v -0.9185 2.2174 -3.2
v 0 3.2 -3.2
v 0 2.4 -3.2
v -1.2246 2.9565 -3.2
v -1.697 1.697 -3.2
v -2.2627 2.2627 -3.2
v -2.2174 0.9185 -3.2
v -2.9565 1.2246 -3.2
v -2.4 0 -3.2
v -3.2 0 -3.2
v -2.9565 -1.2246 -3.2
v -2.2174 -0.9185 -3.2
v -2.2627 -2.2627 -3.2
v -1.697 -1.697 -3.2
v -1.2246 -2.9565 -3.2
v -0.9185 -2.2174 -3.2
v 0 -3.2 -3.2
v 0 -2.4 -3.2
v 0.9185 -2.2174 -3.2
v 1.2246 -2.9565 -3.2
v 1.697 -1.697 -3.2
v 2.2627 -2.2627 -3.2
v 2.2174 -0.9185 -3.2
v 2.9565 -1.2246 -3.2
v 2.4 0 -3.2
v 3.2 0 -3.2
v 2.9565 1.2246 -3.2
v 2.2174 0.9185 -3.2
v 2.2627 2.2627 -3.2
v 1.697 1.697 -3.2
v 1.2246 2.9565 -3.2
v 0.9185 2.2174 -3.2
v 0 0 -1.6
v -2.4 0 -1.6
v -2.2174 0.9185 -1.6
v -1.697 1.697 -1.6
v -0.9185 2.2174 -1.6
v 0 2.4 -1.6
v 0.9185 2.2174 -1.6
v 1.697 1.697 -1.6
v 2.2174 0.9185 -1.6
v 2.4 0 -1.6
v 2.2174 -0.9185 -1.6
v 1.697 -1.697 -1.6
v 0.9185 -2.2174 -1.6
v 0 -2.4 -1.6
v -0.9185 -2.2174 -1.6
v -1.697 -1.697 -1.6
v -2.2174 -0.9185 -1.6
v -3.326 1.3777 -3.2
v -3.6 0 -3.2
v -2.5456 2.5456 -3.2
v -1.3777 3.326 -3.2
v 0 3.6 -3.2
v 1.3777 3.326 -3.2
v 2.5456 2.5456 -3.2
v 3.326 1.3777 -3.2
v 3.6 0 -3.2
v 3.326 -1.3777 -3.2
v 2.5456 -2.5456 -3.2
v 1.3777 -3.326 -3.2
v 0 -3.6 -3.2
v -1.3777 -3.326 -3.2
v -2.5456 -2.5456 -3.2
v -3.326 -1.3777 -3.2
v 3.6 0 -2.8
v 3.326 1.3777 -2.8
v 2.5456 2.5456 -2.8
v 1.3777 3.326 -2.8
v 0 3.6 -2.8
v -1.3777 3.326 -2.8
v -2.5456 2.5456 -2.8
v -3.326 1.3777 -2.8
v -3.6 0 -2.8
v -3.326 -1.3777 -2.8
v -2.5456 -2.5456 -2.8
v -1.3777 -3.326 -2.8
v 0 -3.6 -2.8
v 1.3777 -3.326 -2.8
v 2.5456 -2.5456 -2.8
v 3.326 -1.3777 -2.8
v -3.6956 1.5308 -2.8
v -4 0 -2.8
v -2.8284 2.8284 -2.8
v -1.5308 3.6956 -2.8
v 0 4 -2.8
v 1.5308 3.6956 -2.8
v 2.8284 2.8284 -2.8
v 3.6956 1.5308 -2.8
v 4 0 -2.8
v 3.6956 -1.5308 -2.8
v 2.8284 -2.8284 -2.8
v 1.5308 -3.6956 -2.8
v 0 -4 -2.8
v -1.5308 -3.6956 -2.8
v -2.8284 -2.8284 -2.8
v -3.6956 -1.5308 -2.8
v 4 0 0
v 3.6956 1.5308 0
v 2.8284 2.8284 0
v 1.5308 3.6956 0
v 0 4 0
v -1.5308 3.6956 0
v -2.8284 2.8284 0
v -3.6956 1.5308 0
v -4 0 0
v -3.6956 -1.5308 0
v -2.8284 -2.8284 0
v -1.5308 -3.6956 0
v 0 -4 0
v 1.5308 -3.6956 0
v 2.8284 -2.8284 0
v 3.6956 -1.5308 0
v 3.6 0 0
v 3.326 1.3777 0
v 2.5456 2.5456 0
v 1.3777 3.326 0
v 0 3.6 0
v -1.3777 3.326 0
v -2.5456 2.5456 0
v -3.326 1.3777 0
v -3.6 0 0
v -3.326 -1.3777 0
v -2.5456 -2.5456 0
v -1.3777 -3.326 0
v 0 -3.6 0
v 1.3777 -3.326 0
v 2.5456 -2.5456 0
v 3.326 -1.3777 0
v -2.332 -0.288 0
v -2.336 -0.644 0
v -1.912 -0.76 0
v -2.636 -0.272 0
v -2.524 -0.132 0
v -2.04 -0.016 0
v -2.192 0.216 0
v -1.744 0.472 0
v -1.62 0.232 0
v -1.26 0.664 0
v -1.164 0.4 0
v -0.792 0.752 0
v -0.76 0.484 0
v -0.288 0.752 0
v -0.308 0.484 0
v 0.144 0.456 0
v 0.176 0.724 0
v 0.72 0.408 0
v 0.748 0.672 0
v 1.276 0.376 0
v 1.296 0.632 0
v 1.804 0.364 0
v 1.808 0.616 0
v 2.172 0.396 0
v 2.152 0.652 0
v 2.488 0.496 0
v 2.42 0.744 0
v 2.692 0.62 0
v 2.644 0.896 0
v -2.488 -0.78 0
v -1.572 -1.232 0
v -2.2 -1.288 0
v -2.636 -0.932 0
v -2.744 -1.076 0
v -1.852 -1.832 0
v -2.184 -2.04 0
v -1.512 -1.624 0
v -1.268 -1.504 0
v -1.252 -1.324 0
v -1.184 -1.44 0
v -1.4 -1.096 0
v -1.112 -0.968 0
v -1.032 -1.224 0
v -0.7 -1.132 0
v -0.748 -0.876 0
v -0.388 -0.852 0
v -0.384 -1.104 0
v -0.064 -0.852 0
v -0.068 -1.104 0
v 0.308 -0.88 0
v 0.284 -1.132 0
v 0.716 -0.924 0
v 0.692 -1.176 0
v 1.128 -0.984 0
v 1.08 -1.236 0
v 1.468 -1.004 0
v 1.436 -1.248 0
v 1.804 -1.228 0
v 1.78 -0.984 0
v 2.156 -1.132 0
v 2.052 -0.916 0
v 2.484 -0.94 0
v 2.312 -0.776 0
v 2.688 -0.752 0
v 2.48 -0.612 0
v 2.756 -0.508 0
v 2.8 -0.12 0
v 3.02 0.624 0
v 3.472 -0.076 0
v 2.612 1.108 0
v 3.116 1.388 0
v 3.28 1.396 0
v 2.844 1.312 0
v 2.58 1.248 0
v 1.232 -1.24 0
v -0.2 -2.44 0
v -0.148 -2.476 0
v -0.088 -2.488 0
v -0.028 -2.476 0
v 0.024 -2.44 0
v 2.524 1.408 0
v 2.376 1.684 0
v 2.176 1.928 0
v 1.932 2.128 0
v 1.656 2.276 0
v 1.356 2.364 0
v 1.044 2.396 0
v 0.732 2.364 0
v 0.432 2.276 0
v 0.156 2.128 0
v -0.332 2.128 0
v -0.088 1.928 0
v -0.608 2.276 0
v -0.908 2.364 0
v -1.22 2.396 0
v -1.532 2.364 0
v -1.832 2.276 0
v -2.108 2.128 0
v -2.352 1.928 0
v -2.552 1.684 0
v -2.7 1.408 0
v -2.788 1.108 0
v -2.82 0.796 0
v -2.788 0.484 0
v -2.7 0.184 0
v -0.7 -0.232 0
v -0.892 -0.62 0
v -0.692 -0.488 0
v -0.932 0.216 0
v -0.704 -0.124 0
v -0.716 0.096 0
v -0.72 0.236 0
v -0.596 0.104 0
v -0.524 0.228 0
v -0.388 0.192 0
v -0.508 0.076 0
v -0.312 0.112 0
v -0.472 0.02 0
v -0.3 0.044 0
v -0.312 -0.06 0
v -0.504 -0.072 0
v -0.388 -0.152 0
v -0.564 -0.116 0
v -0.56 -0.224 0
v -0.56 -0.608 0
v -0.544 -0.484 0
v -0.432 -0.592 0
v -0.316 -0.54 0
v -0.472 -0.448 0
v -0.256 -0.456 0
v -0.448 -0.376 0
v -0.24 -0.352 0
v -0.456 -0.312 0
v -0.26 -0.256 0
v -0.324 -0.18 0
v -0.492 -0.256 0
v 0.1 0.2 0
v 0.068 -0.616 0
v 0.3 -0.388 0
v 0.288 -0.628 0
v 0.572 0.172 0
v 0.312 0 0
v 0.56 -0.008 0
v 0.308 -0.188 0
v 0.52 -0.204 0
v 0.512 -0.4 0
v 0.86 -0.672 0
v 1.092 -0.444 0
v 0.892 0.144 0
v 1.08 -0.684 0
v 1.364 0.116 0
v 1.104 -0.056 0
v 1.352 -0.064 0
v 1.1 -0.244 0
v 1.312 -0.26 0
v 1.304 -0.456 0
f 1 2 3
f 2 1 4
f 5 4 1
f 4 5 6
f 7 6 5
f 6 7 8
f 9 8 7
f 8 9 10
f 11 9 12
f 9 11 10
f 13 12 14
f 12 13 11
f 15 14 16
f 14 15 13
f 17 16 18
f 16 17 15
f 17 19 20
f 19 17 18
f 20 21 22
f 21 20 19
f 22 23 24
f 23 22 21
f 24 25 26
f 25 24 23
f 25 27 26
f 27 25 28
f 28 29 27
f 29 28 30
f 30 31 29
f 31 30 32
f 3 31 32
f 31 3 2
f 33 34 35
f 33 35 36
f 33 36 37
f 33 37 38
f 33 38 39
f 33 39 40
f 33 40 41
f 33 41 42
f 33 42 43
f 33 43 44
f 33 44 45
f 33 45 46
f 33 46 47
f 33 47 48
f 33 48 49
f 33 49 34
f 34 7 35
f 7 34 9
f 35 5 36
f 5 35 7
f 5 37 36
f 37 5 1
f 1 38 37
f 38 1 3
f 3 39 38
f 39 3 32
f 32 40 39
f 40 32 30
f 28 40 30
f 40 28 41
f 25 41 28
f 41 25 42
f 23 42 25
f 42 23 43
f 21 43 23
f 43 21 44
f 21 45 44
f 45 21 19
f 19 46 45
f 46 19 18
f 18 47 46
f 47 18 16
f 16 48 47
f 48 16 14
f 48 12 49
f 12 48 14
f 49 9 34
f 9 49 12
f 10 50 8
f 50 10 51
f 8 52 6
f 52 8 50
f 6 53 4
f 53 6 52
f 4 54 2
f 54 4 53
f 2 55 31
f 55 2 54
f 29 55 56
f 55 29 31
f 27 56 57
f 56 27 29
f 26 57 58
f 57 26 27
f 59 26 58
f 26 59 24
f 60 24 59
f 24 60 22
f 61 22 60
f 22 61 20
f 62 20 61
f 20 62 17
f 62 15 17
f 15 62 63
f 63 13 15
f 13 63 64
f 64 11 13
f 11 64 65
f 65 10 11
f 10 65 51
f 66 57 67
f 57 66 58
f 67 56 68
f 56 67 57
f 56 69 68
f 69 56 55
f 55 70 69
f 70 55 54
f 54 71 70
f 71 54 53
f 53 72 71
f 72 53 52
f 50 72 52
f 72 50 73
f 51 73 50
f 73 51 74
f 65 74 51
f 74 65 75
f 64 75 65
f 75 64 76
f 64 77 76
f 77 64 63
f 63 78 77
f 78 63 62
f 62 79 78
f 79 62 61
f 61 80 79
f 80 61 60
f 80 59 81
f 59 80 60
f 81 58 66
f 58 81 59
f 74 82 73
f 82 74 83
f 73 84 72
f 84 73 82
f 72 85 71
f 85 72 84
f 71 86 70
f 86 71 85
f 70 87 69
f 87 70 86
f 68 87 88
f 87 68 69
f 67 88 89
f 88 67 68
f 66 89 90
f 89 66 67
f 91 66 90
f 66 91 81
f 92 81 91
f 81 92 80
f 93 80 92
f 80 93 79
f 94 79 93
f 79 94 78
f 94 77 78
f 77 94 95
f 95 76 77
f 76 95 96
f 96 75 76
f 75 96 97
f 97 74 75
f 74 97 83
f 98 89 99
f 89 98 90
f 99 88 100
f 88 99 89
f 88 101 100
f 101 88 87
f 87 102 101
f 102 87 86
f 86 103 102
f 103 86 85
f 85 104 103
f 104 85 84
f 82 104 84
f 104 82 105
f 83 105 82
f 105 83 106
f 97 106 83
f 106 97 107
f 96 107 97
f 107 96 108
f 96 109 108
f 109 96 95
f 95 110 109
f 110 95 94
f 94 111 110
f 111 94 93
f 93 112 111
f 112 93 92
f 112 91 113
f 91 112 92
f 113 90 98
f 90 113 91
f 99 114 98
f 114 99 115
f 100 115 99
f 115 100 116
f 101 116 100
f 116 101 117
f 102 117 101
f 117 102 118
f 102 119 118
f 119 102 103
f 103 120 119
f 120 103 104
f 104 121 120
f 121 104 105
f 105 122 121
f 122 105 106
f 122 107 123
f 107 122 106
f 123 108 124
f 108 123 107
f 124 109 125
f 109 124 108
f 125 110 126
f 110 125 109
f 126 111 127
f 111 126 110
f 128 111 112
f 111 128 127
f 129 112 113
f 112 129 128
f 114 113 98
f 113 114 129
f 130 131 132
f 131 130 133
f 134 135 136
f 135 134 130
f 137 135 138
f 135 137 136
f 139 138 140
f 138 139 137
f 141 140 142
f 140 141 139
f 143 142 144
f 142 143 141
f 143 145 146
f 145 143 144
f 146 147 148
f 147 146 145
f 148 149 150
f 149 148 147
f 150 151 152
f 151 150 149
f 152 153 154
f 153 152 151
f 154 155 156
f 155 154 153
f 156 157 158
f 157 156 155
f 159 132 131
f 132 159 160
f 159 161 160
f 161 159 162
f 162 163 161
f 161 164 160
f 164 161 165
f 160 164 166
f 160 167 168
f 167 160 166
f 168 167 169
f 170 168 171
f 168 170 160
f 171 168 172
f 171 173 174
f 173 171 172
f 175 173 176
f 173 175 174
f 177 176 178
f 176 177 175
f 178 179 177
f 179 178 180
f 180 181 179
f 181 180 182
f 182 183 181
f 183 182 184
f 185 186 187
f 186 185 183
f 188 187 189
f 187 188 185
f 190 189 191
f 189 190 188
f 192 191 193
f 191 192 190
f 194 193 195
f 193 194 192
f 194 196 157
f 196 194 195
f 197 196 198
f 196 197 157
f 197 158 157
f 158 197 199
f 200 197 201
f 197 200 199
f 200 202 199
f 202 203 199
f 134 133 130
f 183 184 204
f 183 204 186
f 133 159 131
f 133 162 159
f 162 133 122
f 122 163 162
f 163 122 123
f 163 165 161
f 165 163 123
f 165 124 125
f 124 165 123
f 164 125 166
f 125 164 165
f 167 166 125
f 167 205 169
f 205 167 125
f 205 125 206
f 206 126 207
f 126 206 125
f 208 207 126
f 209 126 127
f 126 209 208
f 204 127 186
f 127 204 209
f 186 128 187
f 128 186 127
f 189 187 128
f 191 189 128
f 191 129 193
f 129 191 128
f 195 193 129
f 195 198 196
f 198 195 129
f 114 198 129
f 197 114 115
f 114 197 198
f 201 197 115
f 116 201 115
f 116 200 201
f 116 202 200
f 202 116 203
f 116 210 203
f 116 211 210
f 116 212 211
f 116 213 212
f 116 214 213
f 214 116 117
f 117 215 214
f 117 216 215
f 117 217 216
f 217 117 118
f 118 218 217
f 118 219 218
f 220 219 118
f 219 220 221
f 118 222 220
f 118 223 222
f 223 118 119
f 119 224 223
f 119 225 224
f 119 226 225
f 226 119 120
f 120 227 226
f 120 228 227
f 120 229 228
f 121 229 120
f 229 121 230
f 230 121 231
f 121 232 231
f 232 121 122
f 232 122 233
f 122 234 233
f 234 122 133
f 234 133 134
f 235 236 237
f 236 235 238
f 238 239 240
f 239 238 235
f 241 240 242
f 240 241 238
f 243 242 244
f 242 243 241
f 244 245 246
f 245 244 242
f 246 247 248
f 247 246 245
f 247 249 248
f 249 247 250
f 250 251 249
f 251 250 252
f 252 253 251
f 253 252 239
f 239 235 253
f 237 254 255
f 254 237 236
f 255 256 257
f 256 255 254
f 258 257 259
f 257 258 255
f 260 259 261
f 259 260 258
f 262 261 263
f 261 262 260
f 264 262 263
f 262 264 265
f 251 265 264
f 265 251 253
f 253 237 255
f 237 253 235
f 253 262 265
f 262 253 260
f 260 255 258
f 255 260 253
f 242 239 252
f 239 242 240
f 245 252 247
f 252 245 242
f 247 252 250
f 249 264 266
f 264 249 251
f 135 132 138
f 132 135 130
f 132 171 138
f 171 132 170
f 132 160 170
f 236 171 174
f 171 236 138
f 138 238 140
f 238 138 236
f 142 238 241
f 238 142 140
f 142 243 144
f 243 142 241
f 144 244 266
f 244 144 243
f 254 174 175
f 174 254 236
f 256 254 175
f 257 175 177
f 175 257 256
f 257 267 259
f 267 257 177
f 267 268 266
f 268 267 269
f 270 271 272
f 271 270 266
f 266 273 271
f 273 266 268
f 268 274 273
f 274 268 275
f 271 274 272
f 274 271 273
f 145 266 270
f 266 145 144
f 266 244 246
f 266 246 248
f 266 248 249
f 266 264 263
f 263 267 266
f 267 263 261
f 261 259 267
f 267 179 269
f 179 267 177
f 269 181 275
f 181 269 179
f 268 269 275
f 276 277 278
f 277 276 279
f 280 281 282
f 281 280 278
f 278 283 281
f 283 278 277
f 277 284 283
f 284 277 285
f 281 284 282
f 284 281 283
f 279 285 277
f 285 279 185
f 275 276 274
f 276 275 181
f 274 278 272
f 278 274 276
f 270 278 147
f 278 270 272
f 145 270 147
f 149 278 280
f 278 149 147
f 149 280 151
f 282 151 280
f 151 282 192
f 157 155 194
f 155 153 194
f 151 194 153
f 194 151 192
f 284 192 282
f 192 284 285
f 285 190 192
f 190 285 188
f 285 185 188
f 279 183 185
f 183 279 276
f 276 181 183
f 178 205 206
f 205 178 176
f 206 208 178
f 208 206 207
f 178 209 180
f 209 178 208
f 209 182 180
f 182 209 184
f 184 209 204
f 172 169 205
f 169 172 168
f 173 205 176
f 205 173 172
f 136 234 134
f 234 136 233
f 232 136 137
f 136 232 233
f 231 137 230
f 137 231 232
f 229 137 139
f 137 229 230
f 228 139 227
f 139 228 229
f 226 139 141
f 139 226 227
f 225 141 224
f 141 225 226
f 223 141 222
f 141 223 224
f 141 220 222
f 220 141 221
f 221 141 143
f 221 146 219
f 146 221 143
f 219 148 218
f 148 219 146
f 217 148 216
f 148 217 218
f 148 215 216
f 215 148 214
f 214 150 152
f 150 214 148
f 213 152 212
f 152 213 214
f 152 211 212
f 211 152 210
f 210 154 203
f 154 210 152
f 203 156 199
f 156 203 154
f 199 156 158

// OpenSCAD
use <../lib.scad>
use <s/98138p1ds01.scad>
use <s/98138p1ds02.scad>
function ldraw_lib__98138p1f() = [
// 0 Tile  1 x  1 Round with Dark Pink Heart and Medium Lilac Banner with "BFF" Pattern
// 0 Name: 98138p1f.dat
// 0 Author: Gerald Lasser [GeraldLasser]
// 0 !LDRAW_ORG Part UPDATE 2022-03
// 0 !LICENSE Licensed under CC BY 4.0 : see CAreadme.txt
// 
// 0 BFC CERTIFY CCW
  [0,"BFC","CERTIFY"],
  [0,"BFC","CCW"],
// 
// 0 !KEYWORDS Best Friends Forever, Bricklink 98138pb149, Dots, Mega Pack
// 0 !KEYWORDS Rebrickable 98138pr0164, Set 41913
// 
// 0 !HISTORY 2021-06-14 [RainbowDolphin] Subfiled patterns for colour variants
// 0 !HISTORY 2022-05-07 [PTadmin] Official Update 2022-03
// 
// 
// 1 16 0 0 0 1 0 0 0 1 0 0 0 1 s\98138p1ds01.dat
  [1,16,0,0,0,1,0,0,0,1,0,0,0,1, ldraw_lib__s__98138p1ds01()],
// 1 5 0 0 0 1 0 0 0 1 0 0 0 1 s\98138p1ds02.dat
  [1,5,0,0,0,1,0,0,0,1,0,0,0,1, ldraw_lib__s__98138p1ds02()],
];
module ldraw_lib__98138p1f(step=0, col=false, unit=2/5, alt=false, line=0.2, solid=!$preview)
    makepoly(ldraw_lib__98138p1f(), step=step, col=col, unit=unit, alt=alt, line=line, solid=solid);
ldraw_lib__98138p1f(line=0.2);
